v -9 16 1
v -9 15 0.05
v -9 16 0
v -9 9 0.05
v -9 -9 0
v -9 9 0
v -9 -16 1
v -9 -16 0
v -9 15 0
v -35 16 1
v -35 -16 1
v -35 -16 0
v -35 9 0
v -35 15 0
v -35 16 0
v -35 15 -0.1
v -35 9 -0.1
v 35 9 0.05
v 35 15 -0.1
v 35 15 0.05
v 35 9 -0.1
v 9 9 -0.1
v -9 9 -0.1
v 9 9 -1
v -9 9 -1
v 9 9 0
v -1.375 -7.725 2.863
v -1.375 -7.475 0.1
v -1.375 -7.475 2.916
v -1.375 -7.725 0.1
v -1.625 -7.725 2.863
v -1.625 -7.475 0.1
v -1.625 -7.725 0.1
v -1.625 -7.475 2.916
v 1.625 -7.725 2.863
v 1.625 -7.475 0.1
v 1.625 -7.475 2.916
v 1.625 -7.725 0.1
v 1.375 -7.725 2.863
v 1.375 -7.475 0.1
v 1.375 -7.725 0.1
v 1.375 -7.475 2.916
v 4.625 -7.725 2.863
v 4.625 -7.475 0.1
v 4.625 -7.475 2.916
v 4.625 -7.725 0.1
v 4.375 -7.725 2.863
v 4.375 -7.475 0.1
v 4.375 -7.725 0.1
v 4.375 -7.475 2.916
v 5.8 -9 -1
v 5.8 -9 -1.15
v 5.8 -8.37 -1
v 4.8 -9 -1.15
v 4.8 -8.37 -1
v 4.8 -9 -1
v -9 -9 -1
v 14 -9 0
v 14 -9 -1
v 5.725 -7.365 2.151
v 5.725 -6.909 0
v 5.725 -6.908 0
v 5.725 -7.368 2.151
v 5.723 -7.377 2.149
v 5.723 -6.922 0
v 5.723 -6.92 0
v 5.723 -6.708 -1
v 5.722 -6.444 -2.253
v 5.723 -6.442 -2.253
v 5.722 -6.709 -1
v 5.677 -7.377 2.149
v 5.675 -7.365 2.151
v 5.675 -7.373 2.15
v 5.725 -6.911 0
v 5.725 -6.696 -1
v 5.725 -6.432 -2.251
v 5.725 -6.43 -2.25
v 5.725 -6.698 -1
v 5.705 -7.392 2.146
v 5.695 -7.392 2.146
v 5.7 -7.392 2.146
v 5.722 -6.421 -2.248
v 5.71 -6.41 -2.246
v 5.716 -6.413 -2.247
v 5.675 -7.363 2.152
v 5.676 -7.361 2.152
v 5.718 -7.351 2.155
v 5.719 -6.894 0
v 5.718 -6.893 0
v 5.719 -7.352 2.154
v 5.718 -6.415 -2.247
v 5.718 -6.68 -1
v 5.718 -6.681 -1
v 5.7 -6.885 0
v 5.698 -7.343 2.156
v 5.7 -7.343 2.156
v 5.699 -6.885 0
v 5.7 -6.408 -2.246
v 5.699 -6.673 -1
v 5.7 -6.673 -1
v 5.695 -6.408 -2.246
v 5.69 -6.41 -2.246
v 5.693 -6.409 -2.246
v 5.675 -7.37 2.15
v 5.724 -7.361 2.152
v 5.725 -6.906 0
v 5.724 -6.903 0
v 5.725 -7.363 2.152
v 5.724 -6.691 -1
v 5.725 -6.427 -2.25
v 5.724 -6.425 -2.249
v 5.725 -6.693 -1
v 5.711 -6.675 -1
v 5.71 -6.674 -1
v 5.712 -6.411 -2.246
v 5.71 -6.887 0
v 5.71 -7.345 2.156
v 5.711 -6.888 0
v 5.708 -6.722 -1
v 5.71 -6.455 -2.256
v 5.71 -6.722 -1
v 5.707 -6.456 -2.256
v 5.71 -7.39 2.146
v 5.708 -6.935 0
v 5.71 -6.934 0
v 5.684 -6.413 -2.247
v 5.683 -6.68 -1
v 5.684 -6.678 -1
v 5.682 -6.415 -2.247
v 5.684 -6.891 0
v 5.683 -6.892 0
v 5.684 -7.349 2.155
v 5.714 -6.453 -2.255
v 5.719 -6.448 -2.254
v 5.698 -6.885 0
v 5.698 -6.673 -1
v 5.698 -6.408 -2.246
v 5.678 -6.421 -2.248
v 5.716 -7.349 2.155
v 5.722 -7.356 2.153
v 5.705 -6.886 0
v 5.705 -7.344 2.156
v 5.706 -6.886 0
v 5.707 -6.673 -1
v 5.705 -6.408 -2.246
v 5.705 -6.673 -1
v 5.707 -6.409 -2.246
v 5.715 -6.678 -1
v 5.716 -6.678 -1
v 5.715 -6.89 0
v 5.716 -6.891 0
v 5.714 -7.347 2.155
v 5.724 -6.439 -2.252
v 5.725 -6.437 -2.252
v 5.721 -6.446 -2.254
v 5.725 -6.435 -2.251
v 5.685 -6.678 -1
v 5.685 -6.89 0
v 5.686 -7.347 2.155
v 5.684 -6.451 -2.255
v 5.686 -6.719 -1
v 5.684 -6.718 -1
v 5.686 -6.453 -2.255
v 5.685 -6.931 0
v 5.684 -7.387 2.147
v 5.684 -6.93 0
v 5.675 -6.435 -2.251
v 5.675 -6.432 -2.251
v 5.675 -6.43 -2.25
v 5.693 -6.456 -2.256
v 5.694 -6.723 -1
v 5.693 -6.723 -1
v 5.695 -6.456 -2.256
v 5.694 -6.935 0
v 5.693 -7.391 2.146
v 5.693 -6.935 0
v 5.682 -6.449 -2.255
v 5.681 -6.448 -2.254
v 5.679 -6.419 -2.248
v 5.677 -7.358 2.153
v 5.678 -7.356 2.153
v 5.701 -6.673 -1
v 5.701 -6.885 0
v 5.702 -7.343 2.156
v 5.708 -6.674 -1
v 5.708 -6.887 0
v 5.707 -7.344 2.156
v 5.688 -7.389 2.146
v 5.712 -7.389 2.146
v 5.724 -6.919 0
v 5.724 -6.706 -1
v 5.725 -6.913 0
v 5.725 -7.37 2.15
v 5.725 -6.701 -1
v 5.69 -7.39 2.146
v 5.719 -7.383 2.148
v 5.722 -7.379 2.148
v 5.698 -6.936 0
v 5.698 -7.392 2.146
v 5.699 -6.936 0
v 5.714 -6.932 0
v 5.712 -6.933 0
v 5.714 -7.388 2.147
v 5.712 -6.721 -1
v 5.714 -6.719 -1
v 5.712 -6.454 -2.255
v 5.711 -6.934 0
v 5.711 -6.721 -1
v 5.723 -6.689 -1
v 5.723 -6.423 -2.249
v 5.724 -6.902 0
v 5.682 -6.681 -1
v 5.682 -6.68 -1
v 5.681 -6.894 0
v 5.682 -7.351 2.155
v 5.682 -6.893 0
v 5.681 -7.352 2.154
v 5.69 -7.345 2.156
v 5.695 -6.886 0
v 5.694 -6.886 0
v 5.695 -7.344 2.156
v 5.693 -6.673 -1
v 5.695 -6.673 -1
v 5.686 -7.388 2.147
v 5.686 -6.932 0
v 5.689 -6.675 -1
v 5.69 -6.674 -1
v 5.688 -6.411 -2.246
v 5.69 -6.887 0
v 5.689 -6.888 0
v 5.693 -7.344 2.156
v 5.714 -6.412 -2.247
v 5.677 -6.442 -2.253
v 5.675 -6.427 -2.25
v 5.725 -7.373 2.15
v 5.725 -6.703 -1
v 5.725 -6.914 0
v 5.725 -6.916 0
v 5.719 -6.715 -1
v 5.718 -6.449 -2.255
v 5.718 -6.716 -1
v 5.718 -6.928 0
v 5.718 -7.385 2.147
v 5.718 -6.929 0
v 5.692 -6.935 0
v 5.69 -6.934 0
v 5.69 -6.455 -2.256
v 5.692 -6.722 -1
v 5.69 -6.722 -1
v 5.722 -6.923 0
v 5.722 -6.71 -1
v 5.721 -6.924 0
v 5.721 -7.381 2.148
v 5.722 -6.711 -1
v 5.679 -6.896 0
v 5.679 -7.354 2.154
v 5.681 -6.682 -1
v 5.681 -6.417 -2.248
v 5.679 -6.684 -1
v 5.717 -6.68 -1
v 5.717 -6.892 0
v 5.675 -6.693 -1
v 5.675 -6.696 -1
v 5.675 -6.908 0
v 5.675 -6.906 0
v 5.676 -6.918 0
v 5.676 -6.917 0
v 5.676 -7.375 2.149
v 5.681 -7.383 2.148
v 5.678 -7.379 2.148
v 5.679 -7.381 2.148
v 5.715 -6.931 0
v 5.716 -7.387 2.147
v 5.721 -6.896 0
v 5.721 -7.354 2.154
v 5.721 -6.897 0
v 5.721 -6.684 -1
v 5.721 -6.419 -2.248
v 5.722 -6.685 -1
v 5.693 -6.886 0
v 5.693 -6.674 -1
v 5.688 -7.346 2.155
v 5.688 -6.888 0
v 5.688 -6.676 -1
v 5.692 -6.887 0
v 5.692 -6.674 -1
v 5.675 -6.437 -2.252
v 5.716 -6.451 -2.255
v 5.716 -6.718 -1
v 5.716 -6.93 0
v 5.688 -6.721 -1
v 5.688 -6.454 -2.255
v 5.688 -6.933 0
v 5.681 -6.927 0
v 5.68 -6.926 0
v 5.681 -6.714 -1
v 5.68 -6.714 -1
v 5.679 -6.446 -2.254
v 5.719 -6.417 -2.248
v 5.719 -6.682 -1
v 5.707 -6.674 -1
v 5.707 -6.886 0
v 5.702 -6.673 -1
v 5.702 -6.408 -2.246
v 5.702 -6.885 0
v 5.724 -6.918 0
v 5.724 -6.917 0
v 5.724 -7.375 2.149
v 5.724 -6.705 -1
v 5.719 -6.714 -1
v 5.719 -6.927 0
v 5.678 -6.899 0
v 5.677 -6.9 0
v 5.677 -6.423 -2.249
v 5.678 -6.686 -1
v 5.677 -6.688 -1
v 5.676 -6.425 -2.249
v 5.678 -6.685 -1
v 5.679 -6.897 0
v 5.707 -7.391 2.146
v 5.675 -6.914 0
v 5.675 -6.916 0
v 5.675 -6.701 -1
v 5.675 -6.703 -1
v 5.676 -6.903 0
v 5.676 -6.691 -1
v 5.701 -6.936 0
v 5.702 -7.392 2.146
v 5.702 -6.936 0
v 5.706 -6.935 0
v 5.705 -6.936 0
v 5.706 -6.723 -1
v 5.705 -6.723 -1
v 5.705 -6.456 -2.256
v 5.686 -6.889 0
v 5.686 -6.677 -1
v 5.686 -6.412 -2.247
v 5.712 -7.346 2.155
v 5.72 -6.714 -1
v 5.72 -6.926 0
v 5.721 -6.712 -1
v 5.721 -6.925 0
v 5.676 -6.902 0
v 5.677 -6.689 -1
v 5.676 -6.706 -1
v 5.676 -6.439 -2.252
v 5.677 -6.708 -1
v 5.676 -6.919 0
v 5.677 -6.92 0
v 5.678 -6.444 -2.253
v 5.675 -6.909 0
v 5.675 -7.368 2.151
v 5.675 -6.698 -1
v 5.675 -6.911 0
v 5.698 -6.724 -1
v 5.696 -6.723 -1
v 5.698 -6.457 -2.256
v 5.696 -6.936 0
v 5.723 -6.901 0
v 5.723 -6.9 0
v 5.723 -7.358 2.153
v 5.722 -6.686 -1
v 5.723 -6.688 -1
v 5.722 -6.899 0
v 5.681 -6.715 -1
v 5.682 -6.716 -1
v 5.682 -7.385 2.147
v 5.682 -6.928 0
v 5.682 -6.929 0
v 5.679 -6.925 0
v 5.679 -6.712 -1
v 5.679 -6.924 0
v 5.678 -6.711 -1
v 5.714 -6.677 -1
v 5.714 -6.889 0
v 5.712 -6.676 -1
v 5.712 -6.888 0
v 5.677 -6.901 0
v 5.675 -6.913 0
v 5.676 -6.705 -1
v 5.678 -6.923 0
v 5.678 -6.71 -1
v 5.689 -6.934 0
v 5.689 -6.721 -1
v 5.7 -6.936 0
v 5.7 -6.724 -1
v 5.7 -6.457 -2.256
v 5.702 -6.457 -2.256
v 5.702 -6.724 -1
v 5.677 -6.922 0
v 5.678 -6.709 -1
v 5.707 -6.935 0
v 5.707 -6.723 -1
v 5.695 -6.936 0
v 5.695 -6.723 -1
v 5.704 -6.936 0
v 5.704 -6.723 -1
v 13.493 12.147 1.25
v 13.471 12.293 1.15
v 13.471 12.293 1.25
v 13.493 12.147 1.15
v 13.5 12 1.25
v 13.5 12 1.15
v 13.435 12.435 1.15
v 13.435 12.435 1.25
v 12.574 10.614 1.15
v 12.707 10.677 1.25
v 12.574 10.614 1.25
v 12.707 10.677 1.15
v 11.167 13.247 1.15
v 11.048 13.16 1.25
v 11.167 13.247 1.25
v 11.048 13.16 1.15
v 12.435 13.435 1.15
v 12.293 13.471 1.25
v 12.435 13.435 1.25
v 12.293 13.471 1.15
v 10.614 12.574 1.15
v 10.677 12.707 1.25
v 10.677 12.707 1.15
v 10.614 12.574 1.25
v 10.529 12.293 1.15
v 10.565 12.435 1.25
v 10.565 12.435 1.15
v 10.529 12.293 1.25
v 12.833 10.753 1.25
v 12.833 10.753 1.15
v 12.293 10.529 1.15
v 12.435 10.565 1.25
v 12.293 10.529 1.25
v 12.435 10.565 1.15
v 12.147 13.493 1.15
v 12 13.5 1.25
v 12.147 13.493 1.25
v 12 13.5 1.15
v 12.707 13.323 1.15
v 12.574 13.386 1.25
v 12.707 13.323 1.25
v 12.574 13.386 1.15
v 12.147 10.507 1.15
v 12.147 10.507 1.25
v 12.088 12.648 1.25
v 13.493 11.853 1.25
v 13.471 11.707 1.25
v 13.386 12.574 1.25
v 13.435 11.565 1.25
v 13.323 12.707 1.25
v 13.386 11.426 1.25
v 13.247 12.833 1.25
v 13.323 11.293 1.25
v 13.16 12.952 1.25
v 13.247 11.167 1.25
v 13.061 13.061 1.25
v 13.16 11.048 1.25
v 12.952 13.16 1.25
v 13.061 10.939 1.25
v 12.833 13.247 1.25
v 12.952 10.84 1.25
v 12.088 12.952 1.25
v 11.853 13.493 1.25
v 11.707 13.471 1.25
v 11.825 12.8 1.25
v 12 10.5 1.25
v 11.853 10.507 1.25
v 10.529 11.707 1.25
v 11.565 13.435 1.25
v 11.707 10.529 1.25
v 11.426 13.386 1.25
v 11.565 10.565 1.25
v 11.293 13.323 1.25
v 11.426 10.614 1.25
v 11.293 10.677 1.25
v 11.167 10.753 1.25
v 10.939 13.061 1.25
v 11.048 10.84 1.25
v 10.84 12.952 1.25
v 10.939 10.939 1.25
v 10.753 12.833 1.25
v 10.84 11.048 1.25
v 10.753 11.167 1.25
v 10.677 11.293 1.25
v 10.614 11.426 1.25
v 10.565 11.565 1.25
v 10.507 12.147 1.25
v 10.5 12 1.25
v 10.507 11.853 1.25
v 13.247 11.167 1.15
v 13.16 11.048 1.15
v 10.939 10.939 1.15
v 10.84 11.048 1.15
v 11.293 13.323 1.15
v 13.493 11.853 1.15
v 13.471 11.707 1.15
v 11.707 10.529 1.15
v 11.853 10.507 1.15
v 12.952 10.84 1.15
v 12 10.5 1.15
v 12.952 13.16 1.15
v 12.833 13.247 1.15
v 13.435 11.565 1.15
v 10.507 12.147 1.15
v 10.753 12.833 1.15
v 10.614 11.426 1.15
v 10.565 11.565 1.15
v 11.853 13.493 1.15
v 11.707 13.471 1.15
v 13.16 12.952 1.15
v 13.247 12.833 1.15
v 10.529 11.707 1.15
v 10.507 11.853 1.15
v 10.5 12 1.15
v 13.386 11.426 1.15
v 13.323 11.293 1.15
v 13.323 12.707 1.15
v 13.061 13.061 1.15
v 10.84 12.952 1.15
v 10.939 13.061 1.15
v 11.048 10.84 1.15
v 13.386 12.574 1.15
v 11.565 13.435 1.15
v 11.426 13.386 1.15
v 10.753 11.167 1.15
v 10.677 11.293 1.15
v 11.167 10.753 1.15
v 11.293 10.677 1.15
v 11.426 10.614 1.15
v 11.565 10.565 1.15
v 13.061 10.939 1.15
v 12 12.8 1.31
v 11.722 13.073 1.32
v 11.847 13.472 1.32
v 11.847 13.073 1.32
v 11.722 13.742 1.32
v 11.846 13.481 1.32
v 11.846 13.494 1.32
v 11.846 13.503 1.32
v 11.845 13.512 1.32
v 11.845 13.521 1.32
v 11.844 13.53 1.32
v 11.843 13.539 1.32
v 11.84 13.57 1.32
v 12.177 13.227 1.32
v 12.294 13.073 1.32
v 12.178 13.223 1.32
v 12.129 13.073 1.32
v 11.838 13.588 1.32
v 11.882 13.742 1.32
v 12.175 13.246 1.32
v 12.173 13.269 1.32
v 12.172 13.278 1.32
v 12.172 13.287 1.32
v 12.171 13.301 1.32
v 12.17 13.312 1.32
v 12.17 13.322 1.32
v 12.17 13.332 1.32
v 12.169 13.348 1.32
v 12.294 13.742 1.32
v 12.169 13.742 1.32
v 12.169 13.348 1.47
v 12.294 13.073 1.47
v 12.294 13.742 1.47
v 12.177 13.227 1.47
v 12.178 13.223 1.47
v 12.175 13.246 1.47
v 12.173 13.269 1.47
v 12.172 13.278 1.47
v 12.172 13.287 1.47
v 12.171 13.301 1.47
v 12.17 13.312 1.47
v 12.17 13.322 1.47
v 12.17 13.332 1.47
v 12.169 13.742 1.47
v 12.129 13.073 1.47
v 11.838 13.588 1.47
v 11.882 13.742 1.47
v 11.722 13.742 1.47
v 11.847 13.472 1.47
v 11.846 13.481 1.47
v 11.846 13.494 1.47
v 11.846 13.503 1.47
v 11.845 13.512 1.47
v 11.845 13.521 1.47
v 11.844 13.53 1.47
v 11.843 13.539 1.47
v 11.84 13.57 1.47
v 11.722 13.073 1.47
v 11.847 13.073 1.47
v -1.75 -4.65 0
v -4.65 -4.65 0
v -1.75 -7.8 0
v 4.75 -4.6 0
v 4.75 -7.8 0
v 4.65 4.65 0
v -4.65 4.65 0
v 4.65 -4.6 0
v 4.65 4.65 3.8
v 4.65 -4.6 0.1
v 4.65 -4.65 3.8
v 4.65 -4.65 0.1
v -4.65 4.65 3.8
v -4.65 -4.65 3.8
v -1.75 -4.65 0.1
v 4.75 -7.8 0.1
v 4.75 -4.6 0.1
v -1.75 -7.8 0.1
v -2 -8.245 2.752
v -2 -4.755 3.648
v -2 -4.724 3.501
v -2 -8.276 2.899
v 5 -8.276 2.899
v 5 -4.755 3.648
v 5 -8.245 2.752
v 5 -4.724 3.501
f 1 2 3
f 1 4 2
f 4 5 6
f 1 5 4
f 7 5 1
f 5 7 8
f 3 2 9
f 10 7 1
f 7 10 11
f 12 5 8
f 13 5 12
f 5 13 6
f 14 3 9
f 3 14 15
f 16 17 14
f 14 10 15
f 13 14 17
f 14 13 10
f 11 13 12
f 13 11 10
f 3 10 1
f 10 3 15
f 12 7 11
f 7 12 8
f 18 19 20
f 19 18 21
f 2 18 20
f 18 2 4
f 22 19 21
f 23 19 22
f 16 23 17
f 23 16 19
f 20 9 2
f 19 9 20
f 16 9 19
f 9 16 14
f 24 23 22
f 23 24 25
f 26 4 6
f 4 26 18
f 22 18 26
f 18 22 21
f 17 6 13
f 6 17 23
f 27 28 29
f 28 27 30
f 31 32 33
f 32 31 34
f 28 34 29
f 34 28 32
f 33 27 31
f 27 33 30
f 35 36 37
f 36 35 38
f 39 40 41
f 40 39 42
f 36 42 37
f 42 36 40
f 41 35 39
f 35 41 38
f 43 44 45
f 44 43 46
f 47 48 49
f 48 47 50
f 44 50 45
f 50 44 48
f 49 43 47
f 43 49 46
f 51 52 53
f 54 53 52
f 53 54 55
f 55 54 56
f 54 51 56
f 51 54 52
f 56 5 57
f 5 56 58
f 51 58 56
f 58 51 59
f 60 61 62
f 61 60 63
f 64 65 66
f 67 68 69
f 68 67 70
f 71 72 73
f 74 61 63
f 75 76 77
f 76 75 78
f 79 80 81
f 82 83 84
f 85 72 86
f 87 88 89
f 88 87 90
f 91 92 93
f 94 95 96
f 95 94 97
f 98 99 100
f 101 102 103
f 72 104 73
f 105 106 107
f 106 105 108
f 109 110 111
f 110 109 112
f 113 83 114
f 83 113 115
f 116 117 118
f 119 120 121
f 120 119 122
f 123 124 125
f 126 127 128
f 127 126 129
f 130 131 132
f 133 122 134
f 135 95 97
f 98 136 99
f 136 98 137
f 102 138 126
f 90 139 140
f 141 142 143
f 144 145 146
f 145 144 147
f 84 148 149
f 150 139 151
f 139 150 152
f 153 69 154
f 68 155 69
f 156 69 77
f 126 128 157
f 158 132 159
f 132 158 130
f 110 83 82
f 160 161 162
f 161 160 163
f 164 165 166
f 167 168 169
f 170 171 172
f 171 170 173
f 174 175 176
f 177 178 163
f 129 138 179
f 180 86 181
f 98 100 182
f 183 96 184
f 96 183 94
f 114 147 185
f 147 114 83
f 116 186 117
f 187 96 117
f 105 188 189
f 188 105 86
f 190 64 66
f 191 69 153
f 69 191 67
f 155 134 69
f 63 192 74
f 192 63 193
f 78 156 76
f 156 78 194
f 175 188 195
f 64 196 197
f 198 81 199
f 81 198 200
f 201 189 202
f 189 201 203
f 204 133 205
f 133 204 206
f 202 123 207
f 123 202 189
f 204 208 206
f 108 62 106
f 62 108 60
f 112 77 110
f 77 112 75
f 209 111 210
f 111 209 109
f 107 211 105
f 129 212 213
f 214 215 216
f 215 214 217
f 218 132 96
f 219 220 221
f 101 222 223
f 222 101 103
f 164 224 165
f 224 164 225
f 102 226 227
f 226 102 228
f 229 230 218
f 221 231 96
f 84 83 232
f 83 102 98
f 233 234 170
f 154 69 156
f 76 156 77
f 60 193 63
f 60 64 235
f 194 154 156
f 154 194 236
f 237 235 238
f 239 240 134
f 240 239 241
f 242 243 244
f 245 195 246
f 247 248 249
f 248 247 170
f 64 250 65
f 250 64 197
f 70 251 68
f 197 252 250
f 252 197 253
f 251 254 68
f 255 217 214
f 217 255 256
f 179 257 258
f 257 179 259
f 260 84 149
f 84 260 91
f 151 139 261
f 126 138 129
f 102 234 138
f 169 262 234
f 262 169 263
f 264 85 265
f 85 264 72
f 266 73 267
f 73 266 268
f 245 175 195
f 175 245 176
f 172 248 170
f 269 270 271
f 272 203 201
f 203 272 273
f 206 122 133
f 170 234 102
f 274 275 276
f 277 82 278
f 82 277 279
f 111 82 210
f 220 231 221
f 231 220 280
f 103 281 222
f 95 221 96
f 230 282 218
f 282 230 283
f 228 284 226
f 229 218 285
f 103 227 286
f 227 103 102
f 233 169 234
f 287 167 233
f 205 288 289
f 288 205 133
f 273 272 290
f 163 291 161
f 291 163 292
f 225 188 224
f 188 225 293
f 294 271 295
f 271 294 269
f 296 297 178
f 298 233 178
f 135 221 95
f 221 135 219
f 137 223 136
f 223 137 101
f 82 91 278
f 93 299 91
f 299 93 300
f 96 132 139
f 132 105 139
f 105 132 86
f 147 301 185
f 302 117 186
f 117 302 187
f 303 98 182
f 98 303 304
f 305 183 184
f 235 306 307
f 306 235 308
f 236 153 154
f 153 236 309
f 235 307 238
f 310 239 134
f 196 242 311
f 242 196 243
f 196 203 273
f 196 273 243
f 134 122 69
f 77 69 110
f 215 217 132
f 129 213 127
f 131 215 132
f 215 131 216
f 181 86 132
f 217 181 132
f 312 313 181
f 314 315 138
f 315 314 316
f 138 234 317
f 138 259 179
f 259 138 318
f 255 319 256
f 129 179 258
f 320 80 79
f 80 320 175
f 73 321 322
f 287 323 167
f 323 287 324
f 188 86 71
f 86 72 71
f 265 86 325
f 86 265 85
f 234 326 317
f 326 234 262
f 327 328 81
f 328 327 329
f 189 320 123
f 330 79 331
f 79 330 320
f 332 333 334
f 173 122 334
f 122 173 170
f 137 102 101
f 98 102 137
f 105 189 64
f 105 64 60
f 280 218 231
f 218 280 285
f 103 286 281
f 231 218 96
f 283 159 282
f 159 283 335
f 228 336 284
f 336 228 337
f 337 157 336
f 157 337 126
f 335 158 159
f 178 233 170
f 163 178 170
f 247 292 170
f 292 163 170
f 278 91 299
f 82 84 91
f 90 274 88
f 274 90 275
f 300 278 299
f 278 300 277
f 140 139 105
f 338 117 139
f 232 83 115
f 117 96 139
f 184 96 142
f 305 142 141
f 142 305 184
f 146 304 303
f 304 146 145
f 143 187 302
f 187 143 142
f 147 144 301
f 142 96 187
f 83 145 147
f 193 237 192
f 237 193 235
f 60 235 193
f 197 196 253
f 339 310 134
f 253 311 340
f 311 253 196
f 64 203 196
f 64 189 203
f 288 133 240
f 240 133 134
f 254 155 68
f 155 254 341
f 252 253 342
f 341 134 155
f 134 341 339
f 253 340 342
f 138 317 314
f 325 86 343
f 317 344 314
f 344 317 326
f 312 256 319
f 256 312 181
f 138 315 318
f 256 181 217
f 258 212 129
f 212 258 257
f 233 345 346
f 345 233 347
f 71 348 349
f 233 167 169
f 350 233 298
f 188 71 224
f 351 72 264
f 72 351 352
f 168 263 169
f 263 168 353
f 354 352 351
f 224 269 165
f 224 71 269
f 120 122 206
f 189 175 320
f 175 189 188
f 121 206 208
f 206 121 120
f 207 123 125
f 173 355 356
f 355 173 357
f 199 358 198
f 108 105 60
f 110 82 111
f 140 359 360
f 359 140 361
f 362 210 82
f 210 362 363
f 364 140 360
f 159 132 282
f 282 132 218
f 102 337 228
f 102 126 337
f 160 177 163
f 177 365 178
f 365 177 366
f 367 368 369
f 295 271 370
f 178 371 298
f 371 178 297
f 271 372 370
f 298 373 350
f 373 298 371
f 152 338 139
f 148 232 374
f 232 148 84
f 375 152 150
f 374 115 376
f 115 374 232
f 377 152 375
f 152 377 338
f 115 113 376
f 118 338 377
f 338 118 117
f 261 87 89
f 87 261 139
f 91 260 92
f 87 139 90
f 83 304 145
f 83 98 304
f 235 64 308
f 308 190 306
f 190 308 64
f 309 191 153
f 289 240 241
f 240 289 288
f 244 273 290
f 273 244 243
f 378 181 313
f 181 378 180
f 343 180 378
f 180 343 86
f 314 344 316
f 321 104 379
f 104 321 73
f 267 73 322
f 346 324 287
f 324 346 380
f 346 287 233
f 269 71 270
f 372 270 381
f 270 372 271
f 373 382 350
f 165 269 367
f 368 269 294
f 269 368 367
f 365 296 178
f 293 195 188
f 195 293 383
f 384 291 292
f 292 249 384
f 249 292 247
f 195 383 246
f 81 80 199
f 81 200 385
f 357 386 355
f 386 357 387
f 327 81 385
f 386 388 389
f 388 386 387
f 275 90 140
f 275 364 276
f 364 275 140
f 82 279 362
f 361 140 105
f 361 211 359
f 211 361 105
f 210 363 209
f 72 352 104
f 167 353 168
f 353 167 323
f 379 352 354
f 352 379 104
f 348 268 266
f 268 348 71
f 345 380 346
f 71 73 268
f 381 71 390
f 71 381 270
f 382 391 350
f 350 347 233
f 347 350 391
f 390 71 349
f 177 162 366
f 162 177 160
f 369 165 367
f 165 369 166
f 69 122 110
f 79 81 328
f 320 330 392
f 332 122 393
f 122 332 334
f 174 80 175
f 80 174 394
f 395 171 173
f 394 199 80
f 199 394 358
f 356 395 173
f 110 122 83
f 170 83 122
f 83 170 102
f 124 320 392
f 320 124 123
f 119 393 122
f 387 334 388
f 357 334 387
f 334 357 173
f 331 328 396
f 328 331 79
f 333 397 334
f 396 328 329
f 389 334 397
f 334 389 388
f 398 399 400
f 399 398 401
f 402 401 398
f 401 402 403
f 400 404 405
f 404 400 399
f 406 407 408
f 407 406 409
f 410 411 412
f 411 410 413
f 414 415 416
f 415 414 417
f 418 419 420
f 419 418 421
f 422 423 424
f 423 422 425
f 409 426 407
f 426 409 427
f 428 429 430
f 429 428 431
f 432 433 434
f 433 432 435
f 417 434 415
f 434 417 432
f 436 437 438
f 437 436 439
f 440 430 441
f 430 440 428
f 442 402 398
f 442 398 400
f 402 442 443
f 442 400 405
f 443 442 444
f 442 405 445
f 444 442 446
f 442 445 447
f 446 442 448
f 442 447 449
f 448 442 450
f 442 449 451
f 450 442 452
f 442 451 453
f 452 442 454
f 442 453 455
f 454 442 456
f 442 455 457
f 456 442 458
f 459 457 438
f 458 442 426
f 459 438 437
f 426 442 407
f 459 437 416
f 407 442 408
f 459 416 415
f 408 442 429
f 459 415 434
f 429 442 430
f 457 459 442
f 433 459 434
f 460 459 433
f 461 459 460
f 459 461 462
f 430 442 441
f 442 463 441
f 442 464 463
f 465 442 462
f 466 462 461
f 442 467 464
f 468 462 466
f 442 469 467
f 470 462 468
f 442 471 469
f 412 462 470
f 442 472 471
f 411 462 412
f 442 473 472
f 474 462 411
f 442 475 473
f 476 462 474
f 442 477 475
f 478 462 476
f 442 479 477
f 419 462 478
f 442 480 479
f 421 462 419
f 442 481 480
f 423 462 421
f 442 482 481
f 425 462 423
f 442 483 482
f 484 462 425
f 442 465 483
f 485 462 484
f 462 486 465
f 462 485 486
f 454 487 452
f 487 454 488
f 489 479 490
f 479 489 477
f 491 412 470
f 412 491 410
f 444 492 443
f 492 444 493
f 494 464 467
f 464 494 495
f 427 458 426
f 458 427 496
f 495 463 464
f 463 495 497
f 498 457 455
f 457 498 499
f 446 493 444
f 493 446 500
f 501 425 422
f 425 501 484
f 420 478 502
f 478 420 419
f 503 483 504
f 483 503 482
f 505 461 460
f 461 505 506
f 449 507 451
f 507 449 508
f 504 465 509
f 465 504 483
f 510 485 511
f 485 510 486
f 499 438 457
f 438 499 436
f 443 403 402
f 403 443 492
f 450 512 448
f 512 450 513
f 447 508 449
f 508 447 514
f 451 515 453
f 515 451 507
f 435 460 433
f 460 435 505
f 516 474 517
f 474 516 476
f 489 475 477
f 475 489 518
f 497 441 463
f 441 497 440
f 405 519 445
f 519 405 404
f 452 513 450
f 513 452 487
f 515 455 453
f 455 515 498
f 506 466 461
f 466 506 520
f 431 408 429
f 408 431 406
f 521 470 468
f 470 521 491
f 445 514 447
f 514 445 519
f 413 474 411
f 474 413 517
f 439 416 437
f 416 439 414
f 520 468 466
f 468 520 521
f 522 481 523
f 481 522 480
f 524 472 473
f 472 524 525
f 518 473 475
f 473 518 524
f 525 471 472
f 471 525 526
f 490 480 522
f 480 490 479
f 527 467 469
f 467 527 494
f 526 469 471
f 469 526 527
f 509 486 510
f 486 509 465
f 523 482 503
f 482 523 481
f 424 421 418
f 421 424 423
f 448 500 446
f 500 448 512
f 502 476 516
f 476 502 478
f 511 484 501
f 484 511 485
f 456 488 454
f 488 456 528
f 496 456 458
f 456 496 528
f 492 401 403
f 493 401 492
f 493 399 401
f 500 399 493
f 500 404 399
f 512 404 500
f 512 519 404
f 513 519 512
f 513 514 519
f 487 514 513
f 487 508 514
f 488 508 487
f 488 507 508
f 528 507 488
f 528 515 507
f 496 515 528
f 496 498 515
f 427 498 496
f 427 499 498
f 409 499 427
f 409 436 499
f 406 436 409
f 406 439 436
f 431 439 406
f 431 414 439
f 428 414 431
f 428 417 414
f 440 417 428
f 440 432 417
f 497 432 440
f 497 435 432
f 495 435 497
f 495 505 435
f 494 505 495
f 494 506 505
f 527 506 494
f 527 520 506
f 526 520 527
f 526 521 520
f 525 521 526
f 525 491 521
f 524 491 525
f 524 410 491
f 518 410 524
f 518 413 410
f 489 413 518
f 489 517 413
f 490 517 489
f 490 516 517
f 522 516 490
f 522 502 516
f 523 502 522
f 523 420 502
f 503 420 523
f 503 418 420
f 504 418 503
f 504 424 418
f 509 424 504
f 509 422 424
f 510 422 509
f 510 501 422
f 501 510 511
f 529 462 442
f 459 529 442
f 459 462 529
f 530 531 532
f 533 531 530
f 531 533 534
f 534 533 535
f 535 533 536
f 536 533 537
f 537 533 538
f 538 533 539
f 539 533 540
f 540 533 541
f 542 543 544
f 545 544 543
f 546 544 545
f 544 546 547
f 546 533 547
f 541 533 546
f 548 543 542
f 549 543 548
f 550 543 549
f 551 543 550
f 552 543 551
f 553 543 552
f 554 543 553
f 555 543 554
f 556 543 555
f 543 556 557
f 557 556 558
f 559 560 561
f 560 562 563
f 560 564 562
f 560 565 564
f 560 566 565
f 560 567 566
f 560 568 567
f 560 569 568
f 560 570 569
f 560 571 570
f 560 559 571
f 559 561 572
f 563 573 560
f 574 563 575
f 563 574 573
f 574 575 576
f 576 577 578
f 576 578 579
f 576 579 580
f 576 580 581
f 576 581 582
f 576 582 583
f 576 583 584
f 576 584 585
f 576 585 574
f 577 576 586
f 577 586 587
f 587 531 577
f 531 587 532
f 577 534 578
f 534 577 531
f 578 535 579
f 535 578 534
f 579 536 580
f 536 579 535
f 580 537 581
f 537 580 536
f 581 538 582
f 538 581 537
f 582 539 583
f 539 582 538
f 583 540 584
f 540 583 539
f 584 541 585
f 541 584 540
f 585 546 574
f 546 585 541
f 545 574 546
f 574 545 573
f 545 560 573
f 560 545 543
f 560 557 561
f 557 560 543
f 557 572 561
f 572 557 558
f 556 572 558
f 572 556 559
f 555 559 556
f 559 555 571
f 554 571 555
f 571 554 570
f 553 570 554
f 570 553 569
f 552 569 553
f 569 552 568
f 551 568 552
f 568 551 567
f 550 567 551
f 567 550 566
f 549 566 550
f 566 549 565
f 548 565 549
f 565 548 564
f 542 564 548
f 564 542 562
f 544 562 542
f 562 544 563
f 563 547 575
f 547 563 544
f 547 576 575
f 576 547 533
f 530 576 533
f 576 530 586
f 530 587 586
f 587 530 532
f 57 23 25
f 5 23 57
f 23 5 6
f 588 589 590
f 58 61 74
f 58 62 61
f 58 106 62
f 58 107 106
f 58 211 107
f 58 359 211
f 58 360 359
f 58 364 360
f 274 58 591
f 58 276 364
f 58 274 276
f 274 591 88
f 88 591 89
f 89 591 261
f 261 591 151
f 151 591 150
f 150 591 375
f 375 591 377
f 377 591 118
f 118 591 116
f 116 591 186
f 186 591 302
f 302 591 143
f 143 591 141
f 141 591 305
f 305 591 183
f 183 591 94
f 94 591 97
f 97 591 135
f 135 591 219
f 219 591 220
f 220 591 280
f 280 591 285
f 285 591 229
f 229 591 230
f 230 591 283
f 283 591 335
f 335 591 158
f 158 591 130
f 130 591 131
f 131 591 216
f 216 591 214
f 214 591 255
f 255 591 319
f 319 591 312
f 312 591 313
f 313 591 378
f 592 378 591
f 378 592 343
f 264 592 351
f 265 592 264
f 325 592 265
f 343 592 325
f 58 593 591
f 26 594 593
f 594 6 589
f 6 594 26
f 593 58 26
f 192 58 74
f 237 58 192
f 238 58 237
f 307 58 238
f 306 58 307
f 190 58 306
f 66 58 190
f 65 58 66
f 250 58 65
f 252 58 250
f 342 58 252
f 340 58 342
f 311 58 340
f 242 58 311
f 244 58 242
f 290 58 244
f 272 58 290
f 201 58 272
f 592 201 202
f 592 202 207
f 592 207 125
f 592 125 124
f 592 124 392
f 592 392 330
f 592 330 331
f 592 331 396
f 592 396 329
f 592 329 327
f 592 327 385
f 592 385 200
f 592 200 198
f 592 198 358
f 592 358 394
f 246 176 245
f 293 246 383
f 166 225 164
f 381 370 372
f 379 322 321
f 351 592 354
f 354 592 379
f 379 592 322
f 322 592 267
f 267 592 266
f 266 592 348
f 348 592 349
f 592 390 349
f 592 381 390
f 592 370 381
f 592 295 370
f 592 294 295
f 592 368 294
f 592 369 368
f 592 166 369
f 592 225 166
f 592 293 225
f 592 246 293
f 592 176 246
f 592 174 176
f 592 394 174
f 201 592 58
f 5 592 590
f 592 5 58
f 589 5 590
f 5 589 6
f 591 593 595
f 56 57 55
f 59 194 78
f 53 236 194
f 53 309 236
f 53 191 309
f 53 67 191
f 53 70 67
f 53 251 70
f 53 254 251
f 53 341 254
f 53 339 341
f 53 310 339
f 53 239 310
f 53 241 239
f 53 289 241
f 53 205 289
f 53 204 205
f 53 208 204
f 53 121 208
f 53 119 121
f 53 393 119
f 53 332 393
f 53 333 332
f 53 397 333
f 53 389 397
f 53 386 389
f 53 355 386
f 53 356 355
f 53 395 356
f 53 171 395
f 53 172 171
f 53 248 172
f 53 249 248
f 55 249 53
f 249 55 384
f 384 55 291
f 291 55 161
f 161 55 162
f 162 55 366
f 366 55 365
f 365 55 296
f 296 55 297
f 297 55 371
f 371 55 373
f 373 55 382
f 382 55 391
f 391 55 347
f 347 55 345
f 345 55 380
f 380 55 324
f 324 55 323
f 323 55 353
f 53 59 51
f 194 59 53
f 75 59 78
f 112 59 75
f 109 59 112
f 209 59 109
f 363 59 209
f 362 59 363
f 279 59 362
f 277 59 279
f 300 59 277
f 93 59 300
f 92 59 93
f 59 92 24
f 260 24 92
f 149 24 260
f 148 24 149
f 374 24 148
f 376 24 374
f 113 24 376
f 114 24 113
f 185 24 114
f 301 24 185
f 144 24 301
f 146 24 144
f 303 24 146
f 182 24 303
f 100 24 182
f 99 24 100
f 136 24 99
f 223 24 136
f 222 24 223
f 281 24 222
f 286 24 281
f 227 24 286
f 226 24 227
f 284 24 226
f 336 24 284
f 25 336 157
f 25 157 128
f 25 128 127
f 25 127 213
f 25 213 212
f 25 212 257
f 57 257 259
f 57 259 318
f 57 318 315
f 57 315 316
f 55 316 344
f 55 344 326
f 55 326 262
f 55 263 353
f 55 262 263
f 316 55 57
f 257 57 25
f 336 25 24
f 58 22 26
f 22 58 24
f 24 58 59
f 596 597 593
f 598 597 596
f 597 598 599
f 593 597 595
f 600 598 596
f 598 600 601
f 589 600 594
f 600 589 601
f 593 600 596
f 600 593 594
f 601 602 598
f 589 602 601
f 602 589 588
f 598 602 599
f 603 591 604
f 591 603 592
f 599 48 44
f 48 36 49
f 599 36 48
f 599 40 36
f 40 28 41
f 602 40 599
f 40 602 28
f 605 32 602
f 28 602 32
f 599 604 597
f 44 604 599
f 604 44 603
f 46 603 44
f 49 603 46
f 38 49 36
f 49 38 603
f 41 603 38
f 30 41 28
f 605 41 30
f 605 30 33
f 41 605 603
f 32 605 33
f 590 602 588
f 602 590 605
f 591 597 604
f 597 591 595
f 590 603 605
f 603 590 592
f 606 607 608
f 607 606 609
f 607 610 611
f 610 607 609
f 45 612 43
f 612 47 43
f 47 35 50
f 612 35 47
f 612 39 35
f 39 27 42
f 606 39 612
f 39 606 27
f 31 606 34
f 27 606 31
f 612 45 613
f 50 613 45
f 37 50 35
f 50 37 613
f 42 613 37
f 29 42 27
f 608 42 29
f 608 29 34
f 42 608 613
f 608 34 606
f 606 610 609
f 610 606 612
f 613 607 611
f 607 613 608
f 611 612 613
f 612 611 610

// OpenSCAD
// =============================================================================================================
// MASJID NURUL FALAH SUKATANI — STEP 13: SOUTH SERAMBI PORCH & ACCESSIBILITY RAMP
// Parametric Architectural CSG Model (OpenSCAD)
//
// STRICT CIVIL MANDATE: NORTH AT TOP (+Y AXIS)
// EXTENDED SOUTH SERAMBI PORCH + DISABLED ACCESSIBILITY RAMP (SLOPE 1:12)
// =============================================================================================================

$fn = 64;
poly_site = [ [-9, -9], [14, -9], [9, 9], [-9, 9] ];

module surroundings() {
    color([0.22, 0.42, 0.24]) translate([-22, 0, 0.5]) cube([26, 32, 1.0], center = true);
    color([0.18, 0.20, 0.24]) translate([-35, 9, -0.10]) cube([70, 6.0, 0.15]);
    
}

module step_13_assembly() {
    surroundings();
    color([0.28, 0.52, 0.30]) translate([0, 0, -1.0]) linear_extrude(height = 1.0) polygon(poly_site);
    
    // Main Hall Body
    color([0.88, 0.88, 0.85, 0.6]) translate([0, 0, 1.9]) cube([9.3, 9.3, 3.8], center = true);

    // South Serambi Covered Porch Platform
    color([0.72, 0.75, 0.80]) translate([1.5, -6.2, 0.0]) cube([6.5, 3.2, 0.20], center = true);

    // Serambi Columns (4 Units)
    color([0.70, 0.74, 0.80]) {
        for (x = [-1.5, 1.5, 4.5]) {
            translate([x, -7.6, 1.5]) cube([0.25, 0.25, 3.0], center = true);
        }
    }

    // Porch Sloped Canopy Roof
    color([0.22, 0.24, 0.28]) translate([1.5, -6.5, 3.2]) rotate([12, 0, 0]) cube([7.0, 3.6, 0.15], center = true);

    // Accessibility Ramp (Slope 1:12 Connecting FFL 0.0m to Alley -1.0m)
    color([0.45, 0.48, 0.52]) {
        polyhedron(
            points = [
                [4.8, -4.8, 0.0], [5.8, -4.8, 0.0], [5.8, -9.0, -1.0], [4.8, -9.0, -1.0],
                [4.8, -4.8, -0.15], [5.8, -4.8, -0.15], [5.8, -9.0, -1.15], [4.8, -9.0, -1.15]
            ],
            faces = [
                [0, 1, 2, 3], [4, 7, 6, 5], [0, 4, 5, 1], [2, 6, 7, 3], [0, 3, 7, 4], [1, 5, 6, 2]
            ]
        );
        // Stainless Handrails
        color([0.90, 0.95, 1.0]) {
            translate([5.7, -6.9, -0.05]) rotate([12, 0, 0]) cylinder(h = 4.5, r = 0.025, center = true);
        }
    }

    // Compass Rose
    translate([12, 12, 1.2]) {
        color([0.0, 0.75, 0.95]) cylinder(h = 0.10, r = 1.5, center = true);
        color([0.95, 0.2, 0.2]) translate([0, 0.8, 0.05]) rotate([0, 0, 180]) cylinder(h = 0.12, r1 = 0.35, r2 = 0.0, $fn = 3, center = true);
        color([0.9, 0.9, 0.9]) translate([0, 1.4, 0.12]) linear_extrude(height = 0.15) text("N", size = 0.7, font = "Liberation Sans:style=Bold", halign = "center", valign = "center");
    }
}

step_13_assembly();
